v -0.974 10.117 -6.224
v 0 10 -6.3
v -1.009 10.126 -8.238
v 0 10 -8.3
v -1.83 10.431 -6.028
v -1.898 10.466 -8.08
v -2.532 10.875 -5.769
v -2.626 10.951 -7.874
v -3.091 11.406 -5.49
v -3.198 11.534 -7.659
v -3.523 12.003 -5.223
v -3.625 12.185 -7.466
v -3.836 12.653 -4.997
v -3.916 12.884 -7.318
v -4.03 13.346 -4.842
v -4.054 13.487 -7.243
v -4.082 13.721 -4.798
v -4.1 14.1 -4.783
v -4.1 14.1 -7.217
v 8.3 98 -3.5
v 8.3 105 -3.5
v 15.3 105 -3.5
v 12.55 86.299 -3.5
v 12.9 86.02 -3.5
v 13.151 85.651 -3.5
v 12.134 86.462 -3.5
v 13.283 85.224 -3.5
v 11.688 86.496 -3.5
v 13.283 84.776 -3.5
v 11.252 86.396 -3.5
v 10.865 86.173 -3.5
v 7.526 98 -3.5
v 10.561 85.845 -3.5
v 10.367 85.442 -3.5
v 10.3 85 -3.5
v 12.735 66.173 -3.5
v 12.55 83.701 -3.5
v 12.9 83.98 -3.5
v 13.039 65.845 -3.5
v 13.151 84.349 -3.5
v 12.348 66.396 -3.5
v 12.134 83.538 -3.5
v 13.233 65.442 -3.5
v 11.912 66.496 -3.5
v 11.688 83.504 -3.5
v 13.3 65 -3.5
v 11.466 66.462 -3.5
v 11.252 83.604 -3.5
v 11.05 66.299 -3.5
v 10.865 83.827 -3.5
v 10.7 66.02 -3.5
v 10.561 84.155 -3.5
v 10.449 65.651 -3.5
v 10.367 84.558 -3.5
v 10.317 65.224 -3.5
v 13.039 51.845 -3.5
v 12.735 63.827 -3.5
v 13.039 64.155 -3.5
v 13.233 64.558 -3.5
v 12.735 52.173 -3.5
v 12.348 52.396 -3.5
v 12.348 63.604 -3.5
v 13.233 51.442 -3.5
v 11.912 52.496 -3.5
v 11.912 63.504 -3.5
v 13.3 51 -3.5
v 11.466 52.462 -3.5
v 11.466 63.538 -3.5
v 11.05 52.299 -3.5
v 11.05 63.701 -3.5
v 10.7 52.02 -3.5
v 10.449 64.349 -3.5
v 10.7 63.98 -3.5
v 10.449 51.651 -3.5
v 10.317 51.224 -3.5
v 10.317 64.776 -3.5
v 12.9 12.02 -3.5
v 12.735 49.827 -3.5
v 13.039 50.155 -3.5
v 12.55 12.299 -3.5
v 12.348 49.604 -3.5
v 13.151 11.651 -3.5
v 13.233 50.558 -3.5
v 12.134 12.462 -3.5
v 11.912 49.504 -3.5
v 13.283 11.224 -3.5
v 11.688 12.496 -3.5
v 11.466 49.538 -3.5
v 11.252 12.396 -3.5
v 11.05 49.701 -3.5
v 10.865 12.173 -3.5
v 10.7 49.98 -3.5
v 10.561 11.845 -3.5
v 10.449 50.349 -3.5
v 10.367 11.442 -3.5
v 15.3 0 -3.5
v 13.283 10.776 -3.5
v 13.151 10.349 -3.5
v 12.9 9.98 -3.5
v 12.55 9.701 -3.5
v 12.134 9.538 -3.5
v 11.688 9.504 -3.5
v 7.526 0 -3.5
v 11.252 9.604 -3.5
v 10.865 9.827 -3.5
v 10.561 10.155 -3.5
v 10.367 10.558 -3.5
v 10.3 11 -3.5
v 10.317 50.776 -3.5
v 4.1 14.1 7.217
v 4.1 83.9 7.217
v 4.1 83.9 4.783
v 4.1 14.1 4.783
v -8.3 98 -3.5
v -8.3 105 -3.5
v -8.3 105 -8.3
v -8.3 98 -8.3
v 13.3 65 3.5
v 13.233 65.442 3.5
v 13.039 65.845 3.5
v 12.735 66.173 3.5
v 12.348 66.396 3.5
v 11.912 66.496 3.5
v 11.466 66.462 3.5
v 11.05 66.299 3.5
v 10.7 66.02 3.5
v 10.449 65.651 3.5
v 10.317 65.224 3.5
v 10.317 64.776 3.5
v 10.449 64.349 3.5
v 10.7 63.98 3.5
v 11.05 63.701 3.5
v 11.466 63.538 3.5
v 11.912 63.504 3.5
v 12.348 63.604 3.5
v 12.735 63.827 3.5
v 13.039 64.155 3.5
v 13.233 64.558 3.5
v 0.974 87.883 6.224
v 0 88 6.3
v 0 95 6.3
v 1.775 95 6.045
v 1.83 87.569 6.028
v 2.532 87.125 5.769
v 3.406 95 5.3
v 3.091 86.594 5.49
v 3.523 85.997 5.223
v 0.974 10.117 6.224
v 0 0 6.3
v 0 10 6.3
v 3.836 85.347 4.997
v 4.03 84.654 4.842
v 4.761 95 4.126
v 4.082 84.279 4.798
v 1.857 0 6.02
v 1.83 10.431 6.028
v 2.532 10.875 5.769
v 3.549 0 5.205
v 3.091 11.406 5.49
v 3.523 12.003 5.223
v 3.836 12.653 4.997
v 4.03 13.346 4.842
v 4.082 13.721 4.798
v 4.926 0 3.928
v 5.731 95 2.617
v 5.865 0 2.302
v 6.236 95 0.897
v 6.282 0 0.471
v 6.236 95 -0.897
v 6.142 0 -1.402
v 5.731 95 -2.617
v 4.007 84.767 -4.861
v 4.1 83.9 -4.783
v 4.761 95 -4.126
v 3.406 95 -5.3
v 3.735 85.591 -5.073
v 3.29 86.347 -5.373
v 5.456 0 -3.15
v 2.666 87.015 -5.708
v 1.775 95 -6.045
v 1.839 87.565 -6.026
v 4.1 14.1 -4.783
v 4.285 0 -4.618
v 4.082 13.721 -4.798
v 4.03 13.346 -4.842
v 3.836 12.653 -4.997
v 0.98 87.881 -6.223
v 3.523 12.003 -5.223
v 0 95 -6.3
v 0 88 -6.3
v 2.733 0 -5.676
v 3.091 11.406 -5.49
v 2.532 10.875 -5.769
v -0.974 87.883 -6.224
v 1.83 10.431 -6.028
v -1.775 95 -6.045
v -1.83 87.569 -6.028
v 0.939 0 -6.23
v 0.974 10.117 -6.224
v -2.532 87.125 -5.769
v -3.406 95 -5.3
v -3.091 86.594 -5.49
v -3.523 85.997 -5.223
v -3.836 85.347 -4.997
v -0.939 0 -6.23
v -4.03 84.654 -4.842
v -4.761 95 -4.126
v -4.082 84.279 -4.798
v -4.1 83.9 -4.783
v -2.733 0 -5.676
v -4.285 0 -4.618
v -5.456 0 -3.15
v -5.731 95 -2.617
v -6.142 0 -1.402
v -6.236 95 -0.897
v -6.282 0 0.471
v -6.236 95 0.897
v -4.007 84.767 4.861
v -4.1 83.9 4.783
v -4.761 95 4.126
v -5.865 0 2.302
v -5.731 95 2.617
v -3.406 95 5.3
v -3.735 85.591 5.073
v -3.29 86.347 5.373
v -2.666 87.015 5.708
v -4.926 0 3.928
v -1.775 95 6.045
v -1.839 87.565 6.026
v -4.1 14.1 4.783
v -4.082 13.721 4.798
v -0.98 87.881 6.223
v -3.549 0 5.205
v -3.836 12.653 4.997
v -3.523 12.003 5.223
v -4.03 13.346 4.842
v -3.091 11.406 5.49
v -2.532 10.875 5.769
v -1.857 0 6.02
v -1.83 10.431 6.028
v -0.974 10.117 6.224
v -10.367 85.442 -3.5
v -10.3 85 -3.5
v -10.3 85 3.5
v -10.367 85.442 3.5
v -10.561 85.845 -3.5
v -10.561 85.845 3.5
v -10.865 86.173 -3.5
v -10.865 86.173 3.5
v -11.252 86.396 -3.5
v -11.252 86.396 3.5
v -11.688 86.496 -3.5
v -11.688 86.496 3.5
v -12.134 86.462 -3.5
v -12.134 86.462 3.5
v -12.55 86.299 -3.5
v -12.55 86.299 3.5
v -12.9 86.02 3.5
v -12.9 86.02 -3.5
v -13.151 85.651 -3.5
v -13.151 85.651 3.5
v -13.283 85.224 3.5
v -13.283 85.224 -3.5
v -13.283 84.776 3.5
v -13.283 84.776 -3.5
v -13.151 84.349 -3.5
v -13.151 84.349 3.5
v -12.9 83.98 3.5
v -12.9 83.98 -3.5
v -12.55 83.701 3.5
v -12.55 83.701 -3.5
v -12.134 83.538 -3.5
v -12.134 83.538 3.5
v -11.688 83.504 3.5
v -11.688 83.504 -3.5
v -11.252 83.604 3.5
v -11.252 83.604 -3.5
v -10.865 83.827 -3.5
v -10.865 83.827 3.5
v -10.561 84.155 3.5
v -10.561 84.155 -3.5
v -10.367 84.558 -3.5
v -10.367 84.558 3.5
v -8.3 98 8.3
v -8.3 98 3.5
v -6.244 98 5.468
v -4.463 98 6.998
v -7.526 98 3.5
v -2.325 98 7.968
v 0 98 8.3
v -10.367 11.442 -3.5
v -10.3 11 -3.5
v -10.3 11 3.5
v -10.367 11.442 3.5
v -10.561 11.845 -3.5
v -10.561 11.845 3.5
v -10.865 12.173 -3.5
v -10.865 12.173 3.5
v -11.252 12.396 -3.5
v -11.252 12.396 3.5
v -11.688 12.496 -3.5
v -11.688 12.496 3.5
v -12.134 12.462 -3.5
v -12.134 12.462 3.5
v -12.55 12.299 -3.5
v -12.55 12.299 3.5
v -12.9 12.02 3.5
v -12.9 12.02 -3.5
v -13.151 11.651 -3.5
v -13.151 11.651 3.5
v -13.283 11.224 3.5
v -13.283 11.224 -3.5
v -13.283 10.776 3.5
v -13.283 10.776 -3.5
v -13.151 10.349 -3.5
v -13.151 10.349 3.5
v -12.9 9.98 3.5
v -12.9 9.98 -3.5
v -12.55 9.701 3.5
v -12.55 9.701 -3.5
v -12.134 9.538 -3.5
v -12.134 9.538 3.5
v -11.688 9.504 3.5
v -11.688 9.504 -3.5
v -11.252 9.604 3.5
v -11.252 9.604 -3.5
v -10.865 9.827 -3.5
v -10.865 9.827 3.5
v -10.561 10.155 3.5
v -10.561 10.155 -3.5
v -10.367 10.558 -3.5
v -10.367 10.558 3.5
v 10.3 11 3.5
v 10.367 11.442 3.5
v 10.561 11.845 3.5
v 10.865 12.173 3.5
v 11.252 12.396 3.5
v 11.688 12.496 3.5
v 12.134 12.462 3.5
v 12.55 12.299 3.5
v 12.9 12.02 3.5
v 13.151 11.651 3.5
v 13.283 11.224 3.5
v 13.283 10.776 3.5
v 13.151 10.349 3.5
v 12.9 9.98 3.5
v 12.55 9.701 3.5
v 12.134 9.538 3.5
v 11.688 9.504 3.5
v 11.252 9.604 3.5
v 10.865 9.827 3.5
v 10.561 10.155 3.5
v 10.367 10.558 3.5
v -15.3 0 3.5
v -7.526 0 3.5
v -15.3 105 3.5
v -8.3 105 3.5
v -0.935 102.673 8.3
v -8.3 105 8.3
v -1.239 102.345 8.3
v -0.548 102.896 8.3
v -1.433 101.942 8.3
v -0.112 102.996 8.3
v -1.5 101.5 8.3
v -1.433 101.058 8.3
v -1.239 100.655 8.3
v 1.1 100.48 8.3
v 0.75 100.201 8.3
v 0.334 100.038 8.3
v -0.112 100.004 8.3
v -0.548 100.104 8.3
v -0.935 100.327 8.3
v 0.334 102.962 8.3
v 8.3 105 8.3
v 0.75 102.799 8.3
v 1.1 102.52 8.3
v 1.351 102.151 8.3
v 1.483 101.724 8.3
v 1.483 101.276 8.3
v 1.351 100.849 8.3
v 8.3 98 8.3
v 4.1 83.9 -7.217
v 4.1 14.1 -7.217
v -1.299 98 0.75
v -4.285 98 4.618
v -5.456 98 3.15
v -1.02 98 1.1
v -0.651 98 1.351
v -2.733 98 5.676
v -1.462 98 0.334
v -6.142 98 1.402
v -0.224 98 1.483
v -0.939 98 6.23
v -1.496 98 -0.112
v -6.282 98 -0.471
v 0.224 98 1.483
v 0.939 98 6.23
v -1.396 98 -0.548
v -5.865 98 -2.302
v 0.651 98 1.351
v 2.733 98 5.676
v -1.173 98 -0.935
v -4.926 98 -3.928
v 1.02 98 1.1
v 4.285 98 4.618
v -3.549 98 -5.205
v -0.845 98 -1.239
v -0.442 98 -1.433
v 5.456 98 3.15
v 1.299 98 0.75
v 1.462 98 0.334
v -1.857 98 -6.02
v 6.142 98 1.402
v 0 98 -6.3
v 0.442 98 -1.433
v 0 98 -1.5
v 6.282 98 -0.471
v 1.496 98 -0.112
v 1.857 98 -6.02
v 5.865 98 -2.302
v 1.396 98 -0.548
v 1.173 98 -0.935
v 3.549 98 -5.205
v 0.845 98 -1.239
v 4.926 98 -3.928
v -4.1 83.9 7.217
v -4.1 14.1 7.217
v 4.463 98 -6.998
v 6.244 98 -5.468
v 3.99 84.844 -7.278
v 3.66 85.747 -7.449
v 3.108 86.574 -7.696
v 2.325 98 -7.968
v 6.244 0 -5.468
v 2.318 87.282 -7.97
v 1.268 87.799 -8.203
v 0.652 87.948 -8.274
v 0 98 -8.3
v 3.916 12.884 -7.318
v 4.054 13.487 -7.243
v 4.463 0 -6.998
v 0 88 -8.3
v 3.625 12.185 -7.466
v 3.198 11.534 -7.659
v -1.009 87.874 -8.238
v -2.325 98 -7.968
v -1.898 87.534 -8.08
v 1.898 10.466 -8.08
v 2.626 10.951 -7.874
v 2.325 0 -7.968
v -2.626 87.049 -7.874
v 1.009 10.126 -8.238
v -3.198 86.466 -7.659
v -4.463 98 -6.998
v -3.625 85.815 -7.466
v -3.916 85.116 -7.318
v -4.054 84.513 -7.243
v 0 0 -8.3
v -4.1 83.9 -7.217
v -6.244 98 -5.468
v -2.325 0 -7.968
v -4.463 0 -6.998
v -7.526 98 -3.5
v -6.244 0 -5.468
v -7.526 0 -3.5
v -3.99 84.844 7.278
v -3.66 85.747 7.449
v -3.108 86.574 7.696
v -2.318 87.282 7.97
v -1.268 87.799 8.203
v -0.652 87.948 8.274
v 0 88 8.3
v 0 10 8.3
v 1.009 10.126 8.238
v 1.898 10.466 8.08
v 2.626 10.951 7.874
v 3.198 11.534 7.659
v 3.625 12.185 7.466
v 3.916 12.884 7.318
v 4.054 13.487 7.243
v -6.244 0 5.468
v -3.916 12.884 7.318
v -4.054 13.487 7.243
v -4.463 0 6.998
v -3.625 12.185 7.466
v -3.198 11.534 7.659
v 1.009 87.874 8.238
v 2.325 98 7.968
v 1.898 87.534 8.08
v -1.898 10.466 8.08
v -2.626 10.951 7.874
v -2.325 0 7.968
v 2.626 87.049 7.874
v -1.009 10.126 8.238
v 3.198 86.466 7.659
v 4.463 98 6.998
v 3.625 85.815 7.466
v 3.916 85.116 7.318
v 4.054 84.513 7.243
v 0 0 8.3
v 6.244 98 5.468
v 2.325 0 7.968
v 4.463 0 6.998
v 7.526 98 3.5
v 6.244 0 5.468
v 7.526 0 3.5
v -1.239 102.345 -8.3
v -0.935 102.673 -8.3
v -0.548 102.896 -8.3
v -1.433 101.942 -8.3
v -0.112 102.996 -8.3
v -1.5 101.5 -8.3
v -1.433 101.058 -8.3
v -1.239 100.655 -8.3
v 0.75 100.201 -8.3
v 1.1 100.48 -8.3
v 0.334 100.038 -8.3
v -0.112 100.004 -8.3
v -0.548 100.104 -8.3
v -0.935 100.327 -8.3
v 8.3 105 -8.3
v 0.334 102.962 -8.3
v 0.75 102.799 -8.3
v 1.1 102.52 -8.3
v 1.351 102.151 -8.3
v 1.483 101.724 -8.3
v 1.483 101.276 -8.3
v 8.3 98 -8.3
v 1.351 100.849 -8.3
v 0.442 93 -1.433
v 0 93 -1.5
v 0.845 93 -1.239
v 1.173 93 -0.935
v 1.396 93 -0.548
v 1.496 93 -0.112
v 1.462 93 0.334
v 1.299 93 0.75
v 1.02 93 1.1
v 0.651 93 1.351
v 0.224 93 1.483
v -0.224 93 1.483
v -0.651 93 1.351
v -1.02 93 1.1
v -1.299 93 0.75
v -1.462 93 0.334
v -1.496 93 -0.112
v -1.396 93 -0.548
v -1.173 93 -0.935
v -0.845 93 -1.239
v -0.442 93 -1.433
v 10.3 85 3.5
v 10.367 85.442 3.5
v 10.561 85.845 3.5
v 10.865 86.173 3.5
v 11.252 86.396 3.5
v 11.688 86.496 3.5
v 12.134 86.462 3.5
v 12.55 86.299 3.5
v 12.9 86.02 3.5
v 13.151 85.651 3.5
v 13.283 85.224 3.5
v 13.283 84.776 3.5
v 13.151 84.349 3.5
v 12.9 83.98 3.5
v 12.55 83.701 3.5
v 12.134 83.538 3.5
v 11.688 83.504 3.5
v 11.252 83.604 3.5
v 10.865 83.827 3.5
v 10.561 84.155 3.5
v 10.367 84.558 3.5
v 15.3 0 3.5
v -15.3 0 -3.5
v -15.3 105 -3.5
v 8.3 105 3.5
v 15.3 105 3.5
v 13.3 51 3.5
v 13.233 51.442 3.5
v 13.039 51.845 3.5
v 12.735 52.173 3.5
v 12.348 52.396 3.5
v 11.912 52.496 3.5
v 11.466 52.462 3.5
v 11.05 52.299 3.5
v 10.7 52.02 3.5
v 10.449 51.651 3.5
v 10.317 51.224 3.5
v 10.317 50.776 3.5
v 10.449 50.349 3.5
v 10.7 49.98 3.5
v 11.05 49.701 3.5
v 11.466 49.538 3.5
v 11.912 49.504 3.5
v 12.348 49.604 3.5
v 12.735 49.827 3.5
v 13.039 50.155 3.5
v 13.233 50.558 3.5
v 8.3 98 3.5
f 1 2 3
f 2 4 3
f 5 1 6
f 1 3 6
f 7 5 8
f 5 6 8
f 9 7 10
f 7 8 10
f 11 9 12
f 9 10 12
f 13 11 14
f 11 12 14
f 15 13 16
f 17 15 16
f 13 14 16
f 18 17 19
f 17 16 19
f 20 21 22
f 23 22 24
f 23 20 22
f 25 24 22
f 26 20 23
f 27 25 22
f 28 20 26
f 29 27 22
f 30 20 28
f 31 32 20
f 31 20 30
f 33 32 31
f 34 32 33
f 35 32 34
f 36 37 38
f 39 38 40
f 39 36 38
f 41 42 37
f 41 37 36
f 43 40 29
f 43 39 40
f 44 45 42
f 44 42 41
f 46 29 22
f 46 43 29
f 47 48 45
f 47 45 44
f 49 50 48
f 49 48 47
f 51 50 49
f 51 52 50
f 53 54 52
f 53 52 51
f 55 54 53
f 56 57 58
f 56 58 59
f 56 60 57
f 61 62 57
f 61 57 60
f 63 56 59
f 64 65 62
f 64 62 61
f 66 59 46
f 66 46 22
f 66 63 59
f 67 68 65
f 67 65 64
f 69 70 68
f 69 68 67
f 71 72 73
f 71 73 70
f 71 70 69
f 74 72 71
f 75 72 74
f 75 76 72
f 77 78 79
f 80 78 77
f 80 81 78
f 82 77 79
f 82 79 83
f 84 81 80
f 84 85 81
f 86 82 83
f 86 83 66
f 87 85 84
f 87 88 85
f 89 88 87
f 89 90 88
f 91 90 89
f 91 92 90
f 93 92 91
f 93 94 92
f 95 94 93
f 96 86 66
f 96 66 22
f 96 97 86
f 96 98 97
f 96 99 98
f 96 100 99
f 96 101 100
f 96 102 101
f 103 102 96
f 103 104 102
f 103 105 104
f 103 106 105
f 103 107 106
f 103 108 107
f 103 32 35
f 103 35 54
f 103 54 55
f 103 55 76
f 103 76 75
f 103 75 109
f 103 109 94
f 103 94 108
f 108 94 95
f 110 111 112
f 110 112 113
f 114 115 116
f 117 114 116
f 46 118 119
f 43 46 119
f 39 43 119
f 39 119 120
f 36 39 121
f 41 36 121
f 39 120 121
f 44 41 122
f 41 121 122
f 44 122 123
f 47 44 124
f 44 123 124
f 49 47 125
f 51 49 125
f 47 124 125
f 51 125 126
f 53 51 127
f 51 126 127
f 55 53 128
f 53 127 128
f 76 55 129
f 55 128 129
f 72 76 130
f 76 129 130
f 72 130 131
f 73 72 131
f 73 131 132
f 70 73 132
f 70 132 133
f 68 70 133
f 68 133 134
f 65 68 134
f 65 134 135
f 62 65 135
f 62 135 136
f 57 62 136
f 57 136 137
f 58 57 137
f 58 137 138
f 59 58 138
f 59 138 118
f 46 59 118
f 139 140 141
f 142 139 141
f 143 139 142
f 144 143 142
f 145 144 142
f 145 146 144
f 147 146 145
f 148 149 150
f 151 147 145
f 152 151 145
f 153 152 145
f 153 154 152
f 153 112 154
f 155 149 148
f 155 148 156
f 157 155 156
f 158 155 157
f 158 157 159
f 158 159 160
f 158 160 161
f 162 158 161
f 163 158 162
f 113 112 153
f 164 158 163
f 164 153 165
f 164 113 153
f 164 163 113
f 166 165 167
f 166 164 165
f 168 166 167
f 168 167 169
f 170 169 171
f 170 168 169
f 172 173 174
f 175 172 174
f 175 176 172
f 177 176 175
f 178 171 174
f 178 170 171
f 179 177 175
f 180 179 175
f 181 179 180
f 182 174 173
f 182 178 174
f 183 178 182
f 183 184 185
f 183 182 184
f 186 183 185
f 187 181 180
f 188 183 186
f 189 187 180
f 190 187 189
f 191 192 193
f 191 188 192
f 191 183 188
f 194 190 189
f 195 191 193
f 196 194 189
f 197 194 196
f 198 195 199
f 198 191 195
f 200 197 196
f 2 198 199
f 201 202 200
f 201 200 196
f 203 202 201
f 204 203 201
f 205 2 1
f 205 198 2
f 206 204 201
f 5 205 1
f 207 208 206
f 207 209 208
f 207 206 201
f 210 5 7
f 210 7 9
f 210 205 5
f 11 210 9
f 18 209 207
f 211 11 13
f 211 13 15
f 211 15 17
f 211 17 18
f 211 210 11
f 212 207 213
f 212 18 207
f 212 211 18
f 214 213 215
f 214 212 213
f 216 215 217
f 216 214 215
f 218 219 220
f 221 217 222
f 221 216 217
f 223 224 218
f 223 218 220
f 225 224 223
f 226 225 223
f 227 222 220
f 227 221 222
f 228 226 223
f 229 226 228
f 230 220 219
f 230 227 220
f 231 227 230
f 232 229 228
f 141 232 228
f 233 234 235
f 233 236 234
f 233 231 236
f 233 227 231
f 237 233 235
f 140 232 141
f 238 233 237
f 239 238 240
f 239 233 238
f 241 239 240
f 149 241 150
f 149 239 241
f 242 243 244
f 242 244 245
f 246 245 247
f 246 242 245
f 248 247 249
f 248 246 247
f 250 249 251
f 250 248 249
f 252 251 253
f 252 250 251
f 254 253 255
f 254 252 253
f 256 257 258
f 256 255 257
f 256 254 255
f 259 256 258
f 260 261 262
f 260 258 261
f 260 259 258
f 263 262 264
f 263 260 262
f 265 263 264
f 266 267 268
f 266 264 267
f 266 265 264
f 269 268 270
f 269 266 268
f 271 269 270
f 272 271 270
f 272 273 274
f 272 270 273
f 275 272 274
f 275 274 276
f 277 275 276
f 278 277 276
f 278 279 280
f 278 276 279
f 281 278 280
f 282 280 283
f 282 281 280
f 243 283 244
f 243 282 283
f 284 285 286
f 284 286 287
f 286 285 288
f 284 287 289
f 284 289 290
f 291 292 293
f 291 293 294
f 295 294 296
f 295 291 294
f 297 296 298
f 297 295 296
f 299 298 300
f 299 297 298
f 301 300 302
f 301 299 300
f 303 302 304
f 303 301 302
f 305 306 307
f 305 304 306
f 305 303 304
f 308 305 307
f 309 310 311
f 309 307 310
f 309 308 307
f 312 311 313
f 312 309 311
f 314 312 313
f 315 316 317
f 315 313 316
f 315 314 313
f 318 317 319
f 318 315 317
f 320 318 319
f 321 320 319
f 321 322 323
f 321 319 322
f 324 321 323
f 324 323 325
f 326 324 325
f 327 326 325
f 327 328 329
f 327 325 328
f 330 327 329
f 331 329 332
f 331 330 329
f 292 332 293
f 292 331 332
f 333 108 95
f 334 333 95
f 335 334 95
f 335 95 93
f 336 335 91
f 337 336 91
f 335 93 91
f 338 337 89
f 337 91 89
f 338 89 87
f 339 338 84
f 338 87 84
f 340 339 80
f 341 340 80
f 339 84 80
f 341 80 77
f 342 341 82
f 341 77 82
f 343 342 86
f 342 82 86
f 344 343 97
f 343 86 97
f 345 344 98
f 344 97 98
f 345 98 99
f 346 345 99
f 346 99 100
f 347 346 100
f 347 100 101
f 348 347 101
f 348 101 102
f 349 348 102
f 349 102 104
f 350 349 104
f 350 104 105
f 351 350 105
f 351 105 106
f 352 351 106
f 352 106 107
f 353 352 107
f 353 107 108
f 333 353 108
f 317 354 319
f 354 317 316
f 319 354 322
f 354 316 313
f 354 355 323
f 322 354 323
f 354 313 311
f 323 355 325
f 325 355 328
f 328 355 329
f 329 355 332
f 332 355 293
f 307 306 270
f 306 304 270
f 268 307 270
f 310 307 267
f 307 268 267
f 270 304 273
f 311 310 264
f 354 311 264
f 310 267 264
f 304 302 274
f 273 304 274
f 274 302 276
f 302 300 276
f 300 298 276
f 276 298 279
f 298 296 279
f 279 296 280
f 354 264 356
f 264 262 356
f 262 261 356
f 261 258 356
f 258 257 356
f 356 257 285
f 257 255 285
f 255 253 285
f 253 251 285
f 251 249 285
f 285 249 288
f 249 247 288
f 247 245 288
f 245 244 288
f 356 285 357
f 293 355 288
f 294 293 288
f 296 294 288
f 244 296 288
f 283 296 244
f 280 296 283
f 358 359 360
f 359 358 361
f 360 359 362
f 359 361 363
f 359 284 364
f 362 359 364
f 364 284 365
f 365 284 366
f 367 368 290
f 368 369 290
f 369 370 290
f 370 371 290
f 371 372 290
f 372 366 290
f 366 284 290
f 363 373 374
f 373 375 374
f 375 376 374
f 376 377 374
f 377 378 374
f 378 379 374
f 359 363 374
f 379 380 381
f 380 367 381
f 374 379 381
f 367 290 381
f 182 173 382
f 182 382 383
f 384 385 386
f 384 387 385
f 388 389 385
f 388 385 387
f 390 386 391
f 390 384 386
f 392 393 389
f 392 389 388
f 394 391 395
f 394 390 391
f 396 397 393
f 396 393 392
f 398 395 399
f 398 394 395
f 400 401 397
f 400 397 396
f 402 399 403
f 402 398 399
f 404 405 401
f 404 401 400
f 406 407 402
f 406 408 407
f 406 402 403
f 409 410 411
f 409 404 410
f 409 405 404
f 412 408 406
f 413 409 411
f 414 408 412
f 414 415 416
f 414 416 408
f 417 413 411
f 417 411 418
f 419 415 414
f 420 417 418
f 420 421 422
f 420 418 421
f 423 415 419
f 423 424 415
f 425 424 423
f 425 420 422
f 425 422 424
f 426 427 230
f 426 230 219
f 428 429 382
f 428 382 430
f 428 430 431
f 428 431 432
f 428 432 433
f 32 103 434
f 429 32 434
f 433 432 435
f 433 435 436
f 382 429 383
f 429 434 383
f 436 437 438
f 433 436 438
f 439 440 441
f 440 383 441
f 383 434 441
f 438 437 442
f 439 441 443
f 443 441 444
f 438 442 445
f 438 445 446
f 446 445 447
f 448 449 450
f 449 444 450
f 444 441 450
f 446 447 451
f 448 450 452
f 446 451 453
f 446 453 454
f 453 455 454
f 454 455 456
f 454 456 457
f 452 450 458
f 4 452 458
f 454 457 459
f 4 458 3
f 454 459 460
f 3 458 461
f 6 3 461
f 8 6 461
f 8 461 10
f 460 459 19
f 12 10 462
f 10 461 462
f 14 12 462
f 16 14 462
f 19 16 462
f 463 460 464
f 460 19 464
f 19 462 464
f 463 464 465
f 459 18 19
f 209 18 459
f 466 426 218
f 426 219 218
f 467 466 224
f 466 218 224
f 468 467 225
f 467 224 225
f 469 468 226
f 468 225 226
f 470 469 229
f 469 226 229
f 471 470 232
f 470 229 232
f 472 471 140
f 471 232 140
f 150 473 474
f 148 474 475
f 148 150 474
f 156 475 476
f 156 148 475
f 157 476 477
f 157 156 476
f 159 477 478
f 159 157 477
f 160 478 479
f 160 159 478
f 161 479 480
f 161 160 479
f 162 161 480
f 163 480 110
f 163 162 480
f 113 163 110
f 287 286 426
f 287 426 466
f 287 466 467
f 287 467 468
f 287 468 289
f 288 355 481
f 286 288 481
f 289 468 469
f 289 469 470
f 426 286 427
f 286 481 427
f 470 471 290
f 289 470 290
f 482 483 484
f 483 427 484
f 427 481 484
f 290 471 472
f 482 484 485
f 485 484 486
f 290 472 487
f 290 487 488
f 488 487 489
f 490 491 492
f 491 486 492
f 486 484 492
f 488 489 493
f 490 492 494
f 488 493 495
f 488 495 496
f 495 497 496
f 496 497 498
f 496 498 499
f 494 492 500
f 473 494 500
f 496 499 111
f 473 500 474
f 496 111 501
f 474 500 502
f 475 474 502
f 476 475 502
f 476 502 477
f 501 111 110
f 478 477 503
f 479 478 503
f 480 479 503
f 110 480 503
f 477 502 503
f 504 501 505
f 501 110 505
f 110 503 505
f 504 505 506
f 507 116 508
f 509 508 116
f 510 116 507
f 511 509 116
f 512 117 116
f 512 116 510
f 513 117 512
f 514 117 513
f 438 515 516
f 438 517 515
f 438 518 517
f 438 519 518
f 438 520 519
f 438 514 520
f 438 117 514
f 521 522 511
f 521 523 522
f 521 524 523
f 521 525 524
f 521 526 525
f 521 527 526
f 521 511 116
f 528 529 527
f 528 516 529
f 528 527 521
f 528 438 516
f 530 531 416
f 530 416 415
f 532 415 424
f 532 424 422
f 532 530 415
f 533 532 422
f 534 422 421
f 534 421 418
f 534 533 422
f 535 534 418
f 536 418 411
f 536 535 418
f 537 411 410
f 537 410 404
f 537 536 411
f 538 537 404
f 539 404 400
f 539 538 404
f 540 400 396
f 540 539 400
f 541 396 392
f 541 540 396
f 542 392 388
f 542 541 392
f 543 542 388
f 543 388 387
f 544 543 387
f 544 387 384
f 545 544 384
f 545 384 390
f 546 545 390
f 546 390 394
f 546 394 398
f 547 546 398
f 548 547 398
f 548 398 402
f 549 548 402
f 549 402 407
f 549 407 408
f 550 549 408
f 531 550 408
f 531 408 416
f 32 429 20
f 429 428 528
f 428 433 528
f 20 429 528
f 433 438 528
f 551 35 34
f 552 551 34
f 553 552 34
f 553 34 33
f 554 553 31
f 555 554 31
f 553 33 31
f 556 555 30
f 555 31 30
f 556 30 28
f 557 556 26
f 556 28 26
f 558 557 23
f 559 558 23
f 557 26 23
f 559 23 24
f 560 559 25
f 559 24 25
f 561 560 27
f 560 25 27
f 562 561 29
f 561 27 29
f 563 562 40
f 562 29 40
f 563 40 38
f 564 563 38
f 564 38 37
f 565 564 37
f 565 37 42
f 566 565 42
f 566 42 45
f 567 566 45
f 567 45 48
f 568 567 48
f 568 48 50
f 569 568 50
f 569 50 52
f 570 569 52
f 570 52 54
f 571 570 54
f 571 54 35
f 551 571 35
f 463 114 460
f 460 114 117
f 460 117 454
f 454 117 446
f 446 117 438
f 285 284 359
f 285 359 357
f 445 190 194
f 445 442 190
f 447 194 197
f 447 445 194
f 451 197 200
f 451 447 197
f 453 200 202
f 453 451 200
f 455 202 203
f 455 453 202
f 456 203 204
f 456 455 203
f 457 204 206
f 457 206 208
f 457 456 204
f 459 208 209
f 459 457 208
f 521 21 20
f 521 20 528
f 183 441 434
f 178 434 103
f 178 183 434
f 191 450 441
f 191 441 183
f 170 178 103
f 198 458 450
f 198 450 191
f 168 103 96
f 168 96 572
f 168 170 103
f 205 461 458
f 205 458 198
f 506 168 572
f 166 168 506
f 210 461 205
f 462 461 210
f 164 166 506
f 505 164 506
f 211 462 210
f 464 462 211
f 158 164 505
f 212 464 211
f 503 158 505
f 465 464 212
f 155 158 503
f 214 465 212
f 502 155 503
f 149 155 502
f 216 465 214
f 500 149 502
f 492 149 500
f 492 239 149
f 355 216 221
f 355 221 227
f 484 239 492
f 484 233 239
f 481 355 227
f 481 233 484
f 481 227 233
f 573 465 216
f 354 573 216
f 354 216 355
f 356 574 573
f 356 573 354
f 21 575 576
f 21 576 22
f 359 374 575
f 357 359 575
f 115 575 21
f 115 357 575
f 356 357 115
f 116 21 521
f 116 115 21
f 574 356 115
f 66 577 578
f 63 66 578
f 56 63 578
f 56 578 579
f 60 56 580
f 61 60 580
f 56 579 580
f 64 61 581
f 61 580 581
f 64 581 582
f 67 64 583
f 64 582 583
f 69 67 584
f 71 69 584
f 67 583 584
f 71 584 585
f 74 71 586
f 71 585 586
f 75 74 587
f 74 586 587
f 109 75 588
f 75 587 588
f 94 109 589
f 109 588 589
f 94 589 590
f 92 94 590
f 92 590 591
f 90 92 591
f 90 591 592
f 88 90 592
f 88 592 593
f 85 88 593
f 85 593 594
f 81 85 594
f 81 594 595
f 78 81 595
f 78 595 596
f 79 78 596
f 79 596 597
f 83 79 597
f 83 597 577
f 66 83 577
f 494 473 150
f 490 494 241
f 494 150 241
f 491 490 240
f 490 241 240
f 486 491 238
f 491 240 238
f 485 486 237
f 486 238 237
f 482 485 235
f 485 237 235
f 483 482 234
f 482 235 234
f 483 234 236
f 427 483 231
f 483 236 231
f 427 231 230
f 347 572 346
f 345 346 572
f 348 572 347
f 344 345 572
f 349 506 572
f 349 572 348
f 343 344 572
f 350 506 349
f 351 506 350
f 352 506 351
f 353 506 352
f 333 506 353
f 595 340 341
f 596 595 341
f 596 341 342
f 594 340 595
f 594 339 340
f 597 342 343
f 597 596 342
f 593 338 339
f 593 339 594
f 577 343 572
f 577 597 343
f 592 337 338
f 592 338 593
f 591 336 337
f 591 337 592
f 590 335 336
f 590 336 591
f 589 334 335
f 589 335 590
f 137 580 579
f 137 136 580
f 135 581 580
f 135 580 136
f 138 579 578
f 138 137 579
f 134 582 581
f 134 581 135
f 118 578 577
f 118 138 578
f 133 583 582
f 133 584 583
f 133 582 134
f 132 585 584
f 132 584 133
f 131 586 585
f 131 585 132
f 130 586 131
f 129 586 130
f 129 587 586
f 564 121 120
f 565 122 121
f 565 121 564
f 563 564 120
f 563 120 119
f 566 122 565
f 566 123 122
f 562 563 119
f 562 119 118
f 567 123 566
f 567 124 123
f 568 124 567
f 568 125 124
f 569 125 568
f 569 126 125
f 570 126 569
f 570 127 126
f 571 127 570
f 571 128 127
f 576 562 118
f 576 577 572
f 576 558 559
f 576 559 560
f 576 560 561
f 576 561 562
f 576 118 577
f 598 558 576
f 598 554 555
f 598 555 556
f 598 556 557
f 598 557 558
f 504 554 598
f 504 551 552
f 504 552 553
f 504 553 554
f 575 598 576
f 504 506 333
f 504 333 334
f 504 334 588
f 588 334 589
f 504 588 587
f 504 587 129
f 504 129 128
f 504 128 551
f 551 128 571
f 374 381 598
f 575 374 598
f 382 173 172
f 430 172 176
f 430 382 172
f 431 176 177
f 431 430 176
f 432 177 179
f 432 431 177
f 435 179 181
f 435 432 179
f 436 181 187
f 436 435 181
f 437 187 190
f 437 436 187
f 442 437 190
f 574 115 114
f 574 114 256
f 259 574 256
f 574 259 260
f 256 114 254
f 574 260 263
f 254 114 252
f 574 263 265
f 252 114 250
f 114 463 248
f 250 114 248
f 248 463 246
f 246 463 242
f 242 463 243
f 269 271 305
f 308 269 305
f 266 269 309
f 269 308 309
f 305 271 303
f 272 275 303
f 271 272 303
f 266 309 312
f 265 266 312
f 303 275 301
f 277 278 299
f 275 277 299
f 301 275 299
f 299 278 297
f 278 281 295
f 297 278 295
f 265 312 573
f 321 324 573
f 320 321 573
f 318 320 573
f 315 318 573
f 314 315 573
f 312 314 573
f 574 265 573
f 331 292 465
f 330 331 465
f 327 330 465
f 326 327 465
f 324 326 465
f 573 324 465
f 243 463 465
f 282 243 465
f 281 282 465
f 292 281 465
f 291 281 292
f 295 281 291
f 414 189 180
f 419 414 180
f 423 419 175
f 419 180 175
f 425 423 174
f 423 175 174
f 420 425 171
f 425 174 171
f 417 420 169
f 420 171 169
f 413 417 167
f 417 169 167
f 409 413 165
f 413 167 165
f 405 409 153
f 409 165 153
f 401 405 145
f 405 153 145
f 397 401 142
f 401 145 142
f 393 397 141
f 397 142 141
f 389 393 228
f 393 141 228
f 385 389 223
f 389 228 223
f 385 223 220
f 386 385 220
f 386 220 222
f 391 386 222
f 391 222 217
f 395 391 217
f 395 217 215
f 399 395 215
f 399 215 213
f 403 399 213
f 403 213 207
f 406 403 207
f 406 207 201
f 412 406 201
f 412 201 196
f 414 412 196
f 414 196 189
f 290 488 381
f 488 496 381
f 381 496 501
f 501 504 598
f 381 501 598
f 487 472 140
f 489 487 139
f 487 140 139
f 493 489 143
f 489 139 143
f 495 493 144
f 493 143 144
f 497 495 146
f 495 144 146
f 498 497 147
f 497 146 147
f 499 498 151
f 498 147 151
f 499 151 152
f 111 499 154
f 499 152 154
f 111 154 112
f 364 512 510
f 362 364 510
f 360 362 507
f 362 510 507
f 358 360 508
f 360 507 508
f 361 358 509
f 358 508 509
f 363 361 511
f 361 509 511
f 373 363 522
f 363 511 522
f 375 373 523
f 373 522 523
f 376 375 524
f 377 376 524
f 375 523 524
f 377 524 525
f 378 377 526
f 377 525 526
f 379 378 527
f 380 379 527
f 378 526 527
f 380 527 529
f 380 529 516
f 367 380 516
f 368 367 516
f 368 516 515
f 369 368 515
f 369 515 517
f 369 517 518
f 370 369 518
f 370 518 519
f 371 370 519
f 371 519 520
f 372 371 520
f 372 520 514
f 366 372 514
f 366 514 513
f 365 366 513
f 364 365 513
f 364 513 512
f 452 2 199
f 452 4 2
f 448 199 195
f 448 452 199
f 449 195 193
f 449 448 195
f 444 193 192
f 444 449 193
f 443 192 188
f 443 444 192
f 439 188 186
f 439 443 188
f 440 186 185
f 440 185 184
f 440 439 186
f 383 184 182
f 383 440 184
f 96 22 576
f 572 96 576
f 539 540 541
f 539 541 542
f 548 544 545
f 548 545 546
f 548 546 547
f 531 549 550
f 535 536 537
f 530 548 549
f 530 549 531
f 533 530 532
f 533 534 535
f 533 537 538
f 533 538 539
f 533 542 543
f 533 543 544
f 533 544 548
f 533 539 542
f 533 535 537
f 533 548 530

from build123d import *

# Parameters (mm, degrees)
SKETCH1_R                = 8.3
SKETCH1_R_2              = 6.3
BOSS_EXTRUDE1_DEPTH      = 95
SKETCH3_R                = 8.3
BOSS_EXTRUDE2_DEPTH      = 3
SKETCH5_W                = 16.6
SKETCH5_H                = 16.6
BOSS_EXTRUDE4_DEPTH      = 7
CUT_EXTRUDE1_DEPTH       = 107.627623063
FILLET1_R                = 4.1
SKETCH4_R                = 6.3
SKETCH4_R_2              = 1.5
CUT_EXTRUDE3_DEPTH       = 3
BOSS_EXTRUDE6_START      = 2
SKETCH8_R                = 1.5
BOSS_EXTRUDE6_DEPTH      = 2
BOSS_EXTRUDE7_START      = -0.774045
BOSS_EXTRUDE7_DEPTH      = 7.774045
F_3_0_3_DIAMETER_HOLE1_D = 3
F_3_0_3_DIAMETER_HOLE2_D = 3
F_3_0_3_DIAMETER_HOLE3_D = 3


with BuildPart() as part:
    # Sketch1 → Boss-Extrude1 (new body)
    with BuildSketch(Plane(origin=(0, 0, 0), x_dir=(1, 0, 0), z_dir=(0, 1, 0))):
        with Locations(Location((0, 0, 0), (0, 0, 270))):
            Circle(SKETCH1_R)
        with Locations(Location((0, 0, 0), (0, 0, 270))):
            Circle(SKETCH1_R_2, mode=Mode.SUBTRACT)
    extrude(amount=BOSS_EXTRUDE1_DEPTH)

    # Sketch3 → Boss-Extrude2 (add)
    with BuildSketch(Plane(origin=(0, 95, 0), x_dir=(1, 0, 0), z_dir=(0, 1, 0))):
        with Locations(Location((0, 0, 0), (0, 0, 270))):
            Circle(SKETCH3_R)
    extrude(amount=BOSS_EXTRUDE2_DEPTH)

    # Sketch5 → Boss-Extrude4 (add)
    with BuildSketch(Plane(origin=(0, 98, 0), x_dir=(1, 0, 0), z_dir=(0, 1, 0))):
        Rectangle(SKETCH5_W, SKETCH5_H)
    extrude(amount=BOSS_EXTRUDE4_DEPTH)

    # Sketch6 → Cut-Extrude1 (cut, through all)
    with BuildSketch(Plane.XY.offset(8.3)):
        Polygon((4.1, 10), (0, 10), (-4.1, 10), (-4.1, 88), (4.1, 88), align=None)
    extrude(amount=-CUT_EXTRUDE1_DEPTH, mode=Mode.SUBTRACT)

    # Fillet1
    fillet1_edges = [part.edges().sort_by_distance(p)[0] for p in [
        (4.1, 88, 5.999975859),
        (4.1, 88, -5.999975859),
        (-4.1, 88, 5.999975859),
        (-4.1, 88, -5.999975859),
        (4.1, 10, -5.999975859),
        (4.1, 10, 5.999975859),
        (-4.1, 10, -5.999975859),
        (-4.1, 10, 5.999975859),
    ]]
    fillet(fillet1_edges, radius=FILLET1_R - 0.0001)  # a hair under: the kernel refuses the full size

    # Sketch4 → Cut-Extrude3 (cut)
    with BuildSketch(Plane(origin=(0, 95, 0), x_dir=(-1, 0, 0), z_dir=(0, -1, 0))):
        with Locations(Location((0, 0, 0), (0, 0, 90))):
            Circle(SKETCH4_R)
        with Locations(Location((0, 0, 0), (0, 0, 90))):
            Circle(SKETCH4_R_2, mode=Mode.SUBTRACT)
    extrude(amount=-CUT_EXTRUDE3_DEPTH, mode=Mode.SUBTRACT)

    # Sketch8 → Boss-Extrude6 (add)
    with BuildSketch(Plane(origin=(0, 95, 0), x_dir=(-1, 0, 0), z_dir=(0, -1, 0)).offset(BOSS_EXTRUDE6_START)):
        with Locations(Location((0, 0, 0), (0, 0, 90))):
            Circle(SKETCH8_R)
    extrude(amount=-BOSS_EXTRUDE6_DEPTH)

    # Sketch9 → Boss-Extrude7 (add)
    with BuildSketch(Plane.ZY.offset(8.3).offset(BOSS_EXTRUDE7_START)):
        Polygon((0, 0), (3.5, 0), (3.5, 105), (-3.5, 105), (-3.5, 0), align=None)
    boss_extrude7 = extrude(amount=BOSS_EXTRUDE7_DEPTH)

    # Mirror1: Boss-Extrude7 across plane
    add(boss_extrude7.mirror(Plane(origin=(0, 0, 0), x_dir=(0, 0, 1), z_dir=(1, 0, 0))))

    # Ø3.0 (3) Diameter Hole1 (through all)
    with Locations(Plane.XY.offset(8.3)):
        with Locations((0, 101.5)):
            Hole(F_3_0_3_DIAMETER_HOLE1_D / 2)

    # Ø3.0 (3) Diameter Hole2 (through all)
    with Locations(Plane.XY.offset(3.5)):
        with Locations((11.8, 85), (11.8, 11)):
            f_3_0_3_diameter_hole2 = Hole(F_3_0_3_DIAMETER_HOLE2_D / 2)

    # Ø3.0 (3) Diameter Hole3 (through all)
    with Locations(Plane(origin=(0, 0, -3.5), x_dir=(-1, 0, 0), z_dir=(0, 0, -1))):
        with Locations((-11.8, 65), (-11.8, 51)):
            Hole(F_3_0_3_DIAMETER_HOLE3_D / 2)

    # Mirror2: Ø3.0 (3) Diameter Hole2 across plane
    add(f_3_0_3_diameter_hole2.mirror(Plane(origin=(0, 0, 0), x_dir=(0, 0, 1), z_dir=(1, 0, 0))), mode=Mode.SUBTRACT)


solid = part.part
